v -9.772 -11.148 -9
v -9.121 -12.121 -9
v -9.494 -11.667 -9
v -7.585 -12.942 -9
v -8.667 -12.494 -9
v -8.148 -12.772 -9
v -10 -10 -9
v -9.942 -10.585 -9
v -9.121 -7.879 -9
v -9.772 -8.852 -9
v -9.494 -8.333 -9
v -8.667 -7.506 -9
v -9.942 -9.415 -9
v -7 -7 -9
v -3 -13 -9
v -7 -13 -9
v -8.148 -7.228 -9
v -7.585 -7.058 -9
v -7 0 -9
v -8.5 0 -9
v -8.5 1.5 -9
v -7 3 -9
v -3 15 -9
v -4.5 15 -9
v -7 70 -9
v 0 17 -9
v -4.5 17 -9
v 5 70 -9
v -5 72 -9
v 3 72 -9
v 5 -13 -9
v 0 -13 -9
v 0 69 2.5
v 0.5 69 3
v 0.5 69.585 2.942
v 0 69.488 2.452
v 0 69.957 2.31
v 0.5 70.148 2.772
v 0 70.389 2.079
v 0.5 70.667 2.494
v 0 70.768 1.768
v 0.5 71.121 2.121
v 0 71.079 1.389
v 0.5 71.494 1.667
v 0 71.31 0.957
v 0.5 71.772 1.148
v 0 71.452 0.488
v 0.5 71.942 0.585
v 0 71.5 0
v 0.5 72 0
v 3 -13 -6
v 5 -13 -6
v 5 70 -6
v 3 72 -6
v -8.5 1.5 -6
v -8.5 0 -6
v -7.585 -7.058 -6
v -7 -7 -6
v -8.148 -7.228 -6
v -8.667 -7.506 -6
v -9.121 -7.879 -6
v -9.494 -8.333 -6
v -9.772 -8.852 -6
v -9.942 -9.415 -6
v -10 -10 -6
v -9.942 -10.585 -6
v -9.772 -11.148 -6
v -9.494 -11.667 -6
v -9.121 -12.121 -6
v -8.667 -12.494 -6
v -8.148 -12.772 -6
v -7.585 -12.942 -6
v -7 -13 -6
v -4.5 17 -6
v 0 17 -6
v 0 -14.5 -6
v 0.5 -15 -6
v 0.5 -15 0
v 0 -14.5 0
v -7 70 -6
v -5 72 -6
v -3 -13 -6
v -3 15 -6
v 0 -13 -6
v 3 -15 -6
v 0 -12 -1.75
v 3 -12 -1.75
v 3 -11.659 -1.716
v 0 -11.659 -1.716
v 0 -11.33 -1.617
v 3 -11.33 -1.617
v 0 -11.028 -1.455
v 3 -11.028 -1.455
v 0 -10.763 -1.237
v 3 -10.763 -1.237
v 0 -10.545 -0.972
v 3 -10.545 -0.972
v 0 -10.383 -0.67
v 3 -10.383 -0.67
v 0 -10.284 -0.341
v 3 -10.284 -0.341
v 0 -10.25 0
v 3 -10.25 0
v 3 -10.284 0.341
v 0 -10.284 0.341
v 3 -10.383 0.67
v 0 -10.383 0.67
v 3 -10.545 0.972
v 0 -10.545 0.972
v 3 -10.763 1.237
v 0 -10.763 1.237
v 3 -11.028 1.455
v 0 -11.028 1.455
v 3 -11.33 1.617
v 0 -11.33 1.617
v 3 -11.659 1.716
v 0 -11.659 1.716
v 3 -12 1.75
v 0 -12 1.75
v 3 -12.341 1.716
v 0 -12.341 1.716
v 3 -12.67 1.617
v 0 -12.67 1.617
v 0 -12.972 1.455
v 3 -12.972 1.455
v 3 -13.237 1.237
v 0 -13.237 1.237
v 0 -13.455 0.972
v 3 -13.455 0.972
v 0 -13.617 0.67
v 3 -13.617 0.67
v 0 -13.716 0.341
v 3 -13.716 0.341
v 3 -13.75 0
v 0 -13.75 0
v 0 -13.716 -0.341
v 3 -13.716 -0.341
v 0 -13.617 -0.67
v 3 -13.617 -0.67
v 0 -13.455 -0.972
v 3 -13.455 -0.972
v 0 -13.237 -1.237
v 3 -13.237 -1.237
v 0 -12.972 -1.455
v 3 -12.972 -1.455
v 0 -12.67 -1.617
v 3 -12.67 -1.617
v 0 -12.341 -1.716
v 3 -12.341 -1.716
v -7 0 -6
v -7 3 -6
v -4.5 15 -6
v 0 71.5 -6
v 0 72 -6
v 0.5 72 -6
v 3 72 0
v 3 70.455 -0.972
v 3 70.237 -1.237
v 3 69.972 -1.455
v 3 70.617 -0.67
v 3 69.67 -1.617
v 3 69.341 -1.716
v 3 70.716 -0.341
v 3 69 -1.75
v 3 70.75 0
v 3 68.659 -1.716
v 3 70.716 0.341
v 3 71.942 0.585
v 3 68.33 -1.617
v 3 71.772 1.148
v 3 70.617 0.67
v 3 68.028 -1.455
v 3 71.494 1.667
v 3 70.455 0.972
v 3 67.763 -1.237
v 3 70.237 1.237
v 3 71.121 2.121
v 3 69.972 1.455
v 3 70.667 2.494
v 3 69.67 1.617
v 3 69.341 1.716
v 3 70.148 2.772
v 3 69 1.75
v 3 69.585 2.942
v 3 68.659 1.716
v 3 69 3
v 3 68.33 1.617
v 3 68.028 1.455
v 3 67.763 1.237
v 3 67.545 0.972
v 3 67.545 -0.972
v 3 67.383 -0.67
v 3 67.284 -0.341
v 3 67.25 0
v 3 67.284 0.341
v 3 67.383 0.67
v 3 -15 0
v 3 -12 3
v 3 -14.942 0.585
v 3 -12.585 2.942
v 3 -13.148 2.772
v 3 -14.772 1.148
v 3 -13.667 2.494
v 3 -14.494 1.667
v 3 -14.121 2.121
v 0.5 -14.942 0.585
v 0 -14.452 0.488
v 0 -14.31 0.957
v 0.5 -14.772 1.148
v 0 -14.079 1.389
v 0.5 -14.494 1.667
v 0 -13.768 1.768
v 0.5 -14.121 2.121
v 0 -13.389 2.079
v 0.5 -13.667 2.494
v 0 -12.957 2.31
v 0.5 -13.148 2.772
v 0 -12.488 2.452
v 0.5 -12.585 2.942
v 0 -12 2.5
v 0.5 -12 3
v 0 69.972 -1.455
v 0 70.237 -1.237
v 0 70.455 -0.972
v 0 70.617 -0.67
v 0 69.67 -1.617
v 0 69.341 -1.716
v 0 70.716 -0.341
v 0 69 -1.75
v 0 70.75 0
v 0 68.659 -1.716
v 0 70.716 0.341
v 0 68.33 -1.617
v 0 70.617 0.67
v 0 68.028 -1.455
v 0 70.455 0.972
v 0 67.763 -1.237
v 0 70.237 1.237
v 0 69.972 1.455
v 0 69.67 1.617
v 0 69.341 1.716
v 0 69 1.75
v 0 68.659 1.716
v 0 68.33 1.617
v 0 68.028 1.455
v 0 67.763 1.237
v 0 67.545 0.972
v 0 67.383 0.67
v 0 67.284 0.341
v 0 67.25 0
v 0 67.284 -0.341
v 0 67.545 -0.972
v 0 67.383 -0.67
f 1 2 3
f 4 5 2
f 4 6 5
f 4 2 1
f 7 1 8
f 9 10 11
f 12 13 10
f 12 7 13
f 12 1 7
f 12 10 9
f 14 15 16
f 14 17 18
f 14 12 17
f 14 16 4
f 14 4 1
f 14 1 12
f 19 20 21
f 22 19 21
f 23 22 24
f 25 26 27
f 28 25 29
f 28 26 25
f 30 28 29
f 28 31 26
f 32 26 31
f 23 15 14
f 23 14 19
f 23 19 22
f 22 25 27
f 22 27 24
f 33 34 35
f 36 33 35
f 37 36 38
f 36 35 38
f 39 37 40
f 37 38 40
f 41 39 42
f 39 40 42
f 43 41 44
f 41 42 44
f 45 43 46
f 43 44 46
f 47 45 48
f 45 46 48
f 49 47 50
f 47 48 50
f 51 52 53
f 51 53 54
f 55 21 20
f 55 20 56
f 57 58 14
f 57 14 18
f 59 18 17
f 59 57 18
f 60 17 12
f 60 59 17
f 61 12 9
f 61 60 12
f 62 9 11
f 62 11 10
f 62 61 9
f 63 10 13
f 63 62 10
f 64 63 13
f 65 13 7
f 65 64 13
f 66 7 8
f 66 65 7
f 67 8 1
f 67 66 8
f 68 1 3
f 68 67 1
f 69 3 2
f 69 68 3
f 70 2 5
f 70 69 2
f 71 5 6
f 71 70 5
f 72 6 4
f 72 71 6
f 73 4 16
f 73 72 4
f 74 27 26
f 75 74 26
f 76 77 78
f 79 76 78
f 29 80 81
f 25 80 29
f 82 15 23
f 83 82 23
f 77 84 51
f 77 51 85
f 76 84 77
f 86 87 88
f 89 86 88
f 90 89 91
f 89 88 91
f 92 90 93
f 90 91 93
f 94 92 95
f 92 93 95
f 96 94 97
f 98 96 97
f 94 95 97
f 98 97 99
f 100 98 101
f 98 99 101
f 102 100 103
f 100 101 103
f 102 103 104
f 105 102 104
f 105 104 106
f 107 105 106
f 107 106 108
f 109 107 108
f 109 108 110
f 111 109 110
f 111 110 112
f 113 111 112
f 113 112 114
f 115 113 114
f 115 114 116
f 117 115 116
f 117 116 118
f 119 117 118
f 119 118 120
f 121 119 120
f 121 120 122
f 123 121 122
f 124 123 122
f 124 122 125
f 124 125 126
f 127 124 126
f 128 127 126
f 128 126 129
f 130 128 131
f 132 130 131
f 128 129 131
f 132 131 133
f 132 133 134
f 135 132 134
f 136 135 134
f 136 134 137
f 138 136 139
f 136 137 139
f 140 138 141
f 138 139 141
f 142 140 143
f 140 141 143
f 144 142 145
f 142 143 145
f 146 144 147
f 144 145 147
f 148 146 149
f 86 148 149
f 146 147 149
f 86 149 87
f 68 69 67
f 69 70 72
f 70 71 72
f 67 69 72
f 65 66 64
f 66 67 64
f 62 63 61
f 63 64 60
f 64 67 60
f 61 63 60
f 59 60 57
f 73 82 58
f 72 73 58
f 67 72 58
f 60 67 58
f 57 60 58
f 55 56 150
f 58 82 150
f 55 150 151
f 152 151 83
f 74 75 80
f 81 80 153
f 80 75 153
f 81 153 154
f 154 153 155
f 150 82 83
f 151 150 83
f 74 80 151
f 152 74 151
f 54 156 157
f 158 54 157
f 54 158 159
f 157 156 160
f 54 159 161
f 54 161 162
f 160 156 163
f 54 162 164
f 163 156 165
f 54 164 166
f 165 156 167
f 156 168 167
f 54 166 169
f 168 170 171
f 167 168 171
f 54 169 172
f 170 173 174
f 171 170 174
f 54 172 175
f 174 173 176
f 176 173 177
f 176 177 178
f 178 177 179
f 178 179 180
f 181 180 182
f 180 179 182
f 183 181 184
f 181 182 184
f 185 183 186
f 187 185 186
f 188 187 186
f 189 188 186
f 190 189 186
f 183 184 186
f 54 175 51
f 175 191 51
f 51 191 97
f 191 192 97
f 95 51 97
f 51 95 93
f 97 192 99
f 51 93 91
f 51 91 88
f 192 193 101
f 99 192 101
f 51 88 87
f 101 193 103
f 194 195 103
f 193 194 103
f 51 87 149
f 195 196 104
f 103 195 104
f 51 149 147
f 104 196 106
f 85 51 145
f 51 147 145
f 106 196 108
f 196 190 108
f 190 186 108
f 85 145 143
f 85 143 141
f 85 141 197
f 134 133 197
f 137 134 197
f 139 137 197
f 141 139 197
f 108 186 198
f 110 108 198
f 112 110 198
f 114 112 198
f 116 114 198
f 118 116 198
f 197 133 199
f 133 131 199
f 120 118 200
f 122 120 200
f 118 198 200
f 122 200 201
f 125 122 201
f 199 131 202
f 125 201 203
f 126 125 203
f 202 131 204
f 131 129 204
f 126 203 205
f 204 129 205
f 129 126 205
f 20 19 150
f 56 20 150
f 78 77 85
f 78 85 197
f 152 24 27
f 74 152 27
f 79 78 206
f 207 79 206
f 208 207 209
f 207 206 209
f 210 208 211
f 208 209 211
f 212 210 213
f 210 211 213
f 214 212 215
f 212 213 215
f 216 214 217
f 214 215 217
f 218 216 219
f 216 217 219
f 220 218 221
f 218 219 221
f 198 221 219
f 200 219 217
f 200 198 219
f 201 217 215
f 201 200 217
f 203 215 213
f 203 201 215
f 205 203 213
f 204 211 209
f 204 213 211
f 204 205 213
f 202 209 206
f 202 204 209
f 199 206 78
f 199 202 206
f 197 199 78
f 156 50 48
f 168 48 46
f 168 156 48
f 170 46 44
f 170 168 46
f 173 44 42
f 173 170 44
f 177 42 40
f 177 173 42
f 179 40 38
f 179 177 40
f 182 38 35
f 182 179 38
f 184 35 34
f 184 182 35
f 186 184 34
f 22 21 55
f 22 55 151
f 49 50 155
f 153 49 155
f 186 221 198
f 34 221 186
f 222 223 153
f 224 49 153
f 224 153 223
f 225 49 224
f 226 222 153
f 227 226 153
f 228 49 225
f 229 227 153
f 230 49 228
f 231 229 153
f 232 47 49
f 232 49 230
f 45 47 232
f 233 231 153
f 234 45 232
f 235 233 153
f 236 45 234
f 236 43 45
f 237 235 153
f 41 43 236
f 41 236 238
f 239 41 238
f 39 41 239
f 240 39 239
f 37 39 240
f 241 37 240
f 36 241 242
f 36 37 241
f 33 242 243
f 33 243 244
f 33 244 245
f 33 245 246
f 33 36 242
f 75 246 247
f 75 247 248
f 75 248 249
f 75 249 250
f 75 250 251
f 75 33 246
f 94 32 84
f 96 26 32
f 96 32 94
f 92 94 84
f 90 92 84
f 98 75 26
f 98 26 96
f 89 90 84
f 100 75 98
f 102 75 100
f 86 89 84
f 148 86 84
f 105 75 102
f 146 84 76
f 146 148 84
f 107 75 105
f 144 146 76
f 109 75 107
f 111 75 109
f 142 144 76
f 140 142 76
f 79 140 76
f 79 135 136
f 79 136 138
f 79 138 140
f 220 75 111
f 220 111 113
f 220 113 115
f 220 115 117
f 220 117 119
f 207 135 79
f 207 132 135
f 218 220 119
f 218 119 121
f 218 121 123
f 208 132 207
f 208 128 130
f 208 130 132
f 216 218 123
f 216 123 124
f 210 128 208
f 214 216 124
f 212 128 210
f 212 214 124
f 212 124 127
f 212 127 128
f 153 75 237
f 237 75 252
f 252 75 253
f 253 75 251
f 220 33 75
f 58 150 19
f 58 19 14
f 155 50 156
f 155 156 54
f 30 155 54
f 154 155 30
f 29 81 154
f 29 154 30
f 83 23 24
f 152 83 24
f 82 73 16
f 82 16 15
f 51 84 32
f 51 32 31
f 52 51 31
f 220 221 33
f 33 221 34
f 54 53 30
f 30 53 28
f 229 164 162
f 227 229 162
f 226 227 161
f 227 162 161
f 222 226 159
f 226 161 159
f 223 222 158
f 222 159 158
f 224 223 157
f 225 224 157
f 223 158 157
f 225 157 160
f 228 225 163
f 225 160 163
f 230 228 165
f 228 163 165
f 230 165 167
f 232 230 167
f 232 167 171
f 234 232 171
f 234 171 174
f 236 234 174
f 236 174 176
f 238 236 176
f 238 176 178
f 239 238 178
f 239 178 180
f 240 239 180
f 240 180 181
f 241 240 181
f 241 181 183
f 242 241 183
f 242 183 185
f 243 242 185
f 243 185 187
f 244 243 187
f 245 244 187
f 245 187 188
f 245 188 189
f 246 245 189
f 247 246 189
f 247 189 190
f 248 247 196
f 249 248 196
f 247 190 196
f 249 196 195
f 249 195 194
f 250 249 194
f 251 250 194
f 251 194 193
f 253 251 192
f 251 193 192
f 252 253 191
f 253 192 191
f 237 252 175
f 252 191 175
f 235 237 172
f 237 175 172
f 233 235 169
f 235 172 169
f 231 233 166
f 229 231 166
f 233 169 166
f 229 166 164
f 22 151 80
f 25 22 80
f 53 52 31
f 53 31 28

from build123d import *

# Parameters (mm, degrees)
EXTRUDE_1_DEPTH             = 3
SKETCH_2_W                  = 3
SKETCH_2_H                  = 72.000001073
EXTRUDE_2_DEPTH             = 1.5
CUT_EXTRUDE_1_DEPTH         = 73.753007862
SKETCH_4_W                  = 1.5
SKETCH_4_H                  = 69.000001073
CUT_EXTRUDE_2_DEPTH         = 73.753007862
EXTRUDE_3_DEPTH             = 3
DRAFT_1_ANGLE               = 45
HOLE_WIZARD_2_7_2_7_1_D     = 3.5
HOLE_WIZARD_2_7_2_7_1_DEPTH = 5.000000075
FILLET_1_R                  = 3
CHAMFER_1_SIZE              = 2.000001073
CHAMFER_1_SIZE2             = 2
CHAMFER_2_SIZE              = 2
CHAMFER_2_SIZE2             = 2.000001073
CHAMFER_4_SIZE              = 0.5


with BuildPart() as part:
    # ｽｹｯﾁ1 → ﾎﾞｽ - 押し出し1 (new body)
    with BuildSketch(Plane.XY.offset(-6)):
        with BuildLine():
            Line((5.000000075, 72.00000107), (-6.999999925, 72.00000107))
            Line((-6.999999925, 72.00000107), (-6.999999925, -7))
            ThreePointArc((-6.999999925, -7), (-9.999999925, -10), (-6.999999925, -13))
            Line((-6.999999925, -13), (5.000000075, -13))
            Line((5.000000075, -13), (5.000000075, 72.00000107))
        make_face()
    extrude(amount=-EXTRUDE_1_DEPTH)

    # ｽｹｯﾁ2 → ﾎﾞｽ - 押し出し2 (add)
    with BuildSketch(Plane.ZY.offset(6.999999925)):
        with Locations((-7.5, 36.000000537)):
            Rectangle(SKETCH_2_W, SKETCH_2_H)
    extrude(amount=EXTRUDE_2_DEPTH)

    # ｽｹｯﾁ3 → ｶｯﾄ - 押し出し1 (cut, through all)
    with BuildSketch(Plane(origin=(0, 0, -9), x_dir=(-1, 0, 0), z_dir=(0, 0, -1))):
        Polygon((3, -13), (3, 15), (4.5, 15), (4.5, 17), (0, 17), (0, -13), align=None)
    extrude(amount=-CUT_EXTRUDE_1_DEPTH, mode=Mode.SUBTRACT)

    # ｽｹｯﾁ4 → ｶｯﾄ - 押し出し2 (cut, through all)
    with BuildSketch(Plane.XY.offset(-6)):
        with Locations((-7.749999925, 37.500000537)):
            Rectangle(SKETCH_4_W, SKETCH_4_H)
    extrude(amount=-CUT_EXTRUDE_2_DEPTH, mode=Mode.SUBTRACT)

    # ｽｹｯﾁ5 → ﾎﾞｽ - 押し出し3 (add)
    with BuildSketch(Plane(origin=(0, 0, 0), x_dir=(0, -1, 0), z_dir=(-1, 0, 0))):
        Polygon((-72.000001073, 3), (-72.000001073, -3), (-72.000001073, -6), (14.999998927, -6), (14.999998927, 3), align=None)
    extrude(amount=-EXTRUDE_3_DEPTH)

    # 抜き勾配1
    draft_1_faces = [part.faces().sort_by_distance(p)[0] for p in [
        (-7.749999925, 3, -7.5),
    ]]
    draft(draft_1_faces, Plane(origin=(-6.999999925, 3, -9), x_dir=(0, -1, 0), z_dir=(-1, 0, 0)), DRAFT_1_ANGLE)

    # Ø2.7 (2.7) 直径の穴1
    with Locations(Plane.ZY):
        with Locations((0, 69.000001073), (0, -11.999998927)):
            Hole(HOLE_WIZARD_2_7_2_7_1_D / 2, depth=HOLE_WIZARD_2_7_2_7_1_DEPTH)

    # ﾌｨﾚｯﾄ1
    fillet_1_edges = [part.edges().sort_by_distance(p)[0] for p in [
        (1.5, 72.000001073, 3),
        (1.5, -14.999998927, 3),
    ]]
    fillet(fillet_1_edges, radius=FILLET_1_R)

    # 面取り1
    chamfer_1_edges = [part.edges().sort_by_distance(p)[0] for p in [
        (-6.999999925, 72.000001073, -7.5),
    ]]
    chamfer_1_side = [part.faces().sort_by_distance(p)[0] for p in [
        (1.5, 72.00000107, -0.15),
    ]]
    chamfer(chamfer_1_edges, length=CHAMFER_1_SIZE, length2=CHAMFER_1_SIZE2, reference=chamfer_1_side[0])

    # 面取り2
    chamfer_2_edges = [part.edges().sort_by_distance(p)[0] for p in [
        (5.000000075, 72.00000107, -7.5),
    ]]
    chamfer_2_side = [part.faces().sort_by_distance(p)[0] for p in [
        (0.56250042, 72.00000107, -5.812499887),
    ]]
    chamfer(chamfer_2_edges, length=CHAMFER_2_SIZE, length2=CHAMFER_2_SIZE2, reference=chamfer_2_side[0])

    # 面取り4
    chamfer_4_edges = [part.edges().sort_by_distance(p)[0] for p in [
        (0, -14.999998927, -3),
        (0, 28.500001071, 3),
        (0, 72.000001073, -3),
        (0, -14.121319271, 2.121320344),
        (0, 71.121321414, 2.121320344),
    ]]
    chamfer(chamfer_4_edges, length=CHAMFER_4_SIZE)


solid = part.part
